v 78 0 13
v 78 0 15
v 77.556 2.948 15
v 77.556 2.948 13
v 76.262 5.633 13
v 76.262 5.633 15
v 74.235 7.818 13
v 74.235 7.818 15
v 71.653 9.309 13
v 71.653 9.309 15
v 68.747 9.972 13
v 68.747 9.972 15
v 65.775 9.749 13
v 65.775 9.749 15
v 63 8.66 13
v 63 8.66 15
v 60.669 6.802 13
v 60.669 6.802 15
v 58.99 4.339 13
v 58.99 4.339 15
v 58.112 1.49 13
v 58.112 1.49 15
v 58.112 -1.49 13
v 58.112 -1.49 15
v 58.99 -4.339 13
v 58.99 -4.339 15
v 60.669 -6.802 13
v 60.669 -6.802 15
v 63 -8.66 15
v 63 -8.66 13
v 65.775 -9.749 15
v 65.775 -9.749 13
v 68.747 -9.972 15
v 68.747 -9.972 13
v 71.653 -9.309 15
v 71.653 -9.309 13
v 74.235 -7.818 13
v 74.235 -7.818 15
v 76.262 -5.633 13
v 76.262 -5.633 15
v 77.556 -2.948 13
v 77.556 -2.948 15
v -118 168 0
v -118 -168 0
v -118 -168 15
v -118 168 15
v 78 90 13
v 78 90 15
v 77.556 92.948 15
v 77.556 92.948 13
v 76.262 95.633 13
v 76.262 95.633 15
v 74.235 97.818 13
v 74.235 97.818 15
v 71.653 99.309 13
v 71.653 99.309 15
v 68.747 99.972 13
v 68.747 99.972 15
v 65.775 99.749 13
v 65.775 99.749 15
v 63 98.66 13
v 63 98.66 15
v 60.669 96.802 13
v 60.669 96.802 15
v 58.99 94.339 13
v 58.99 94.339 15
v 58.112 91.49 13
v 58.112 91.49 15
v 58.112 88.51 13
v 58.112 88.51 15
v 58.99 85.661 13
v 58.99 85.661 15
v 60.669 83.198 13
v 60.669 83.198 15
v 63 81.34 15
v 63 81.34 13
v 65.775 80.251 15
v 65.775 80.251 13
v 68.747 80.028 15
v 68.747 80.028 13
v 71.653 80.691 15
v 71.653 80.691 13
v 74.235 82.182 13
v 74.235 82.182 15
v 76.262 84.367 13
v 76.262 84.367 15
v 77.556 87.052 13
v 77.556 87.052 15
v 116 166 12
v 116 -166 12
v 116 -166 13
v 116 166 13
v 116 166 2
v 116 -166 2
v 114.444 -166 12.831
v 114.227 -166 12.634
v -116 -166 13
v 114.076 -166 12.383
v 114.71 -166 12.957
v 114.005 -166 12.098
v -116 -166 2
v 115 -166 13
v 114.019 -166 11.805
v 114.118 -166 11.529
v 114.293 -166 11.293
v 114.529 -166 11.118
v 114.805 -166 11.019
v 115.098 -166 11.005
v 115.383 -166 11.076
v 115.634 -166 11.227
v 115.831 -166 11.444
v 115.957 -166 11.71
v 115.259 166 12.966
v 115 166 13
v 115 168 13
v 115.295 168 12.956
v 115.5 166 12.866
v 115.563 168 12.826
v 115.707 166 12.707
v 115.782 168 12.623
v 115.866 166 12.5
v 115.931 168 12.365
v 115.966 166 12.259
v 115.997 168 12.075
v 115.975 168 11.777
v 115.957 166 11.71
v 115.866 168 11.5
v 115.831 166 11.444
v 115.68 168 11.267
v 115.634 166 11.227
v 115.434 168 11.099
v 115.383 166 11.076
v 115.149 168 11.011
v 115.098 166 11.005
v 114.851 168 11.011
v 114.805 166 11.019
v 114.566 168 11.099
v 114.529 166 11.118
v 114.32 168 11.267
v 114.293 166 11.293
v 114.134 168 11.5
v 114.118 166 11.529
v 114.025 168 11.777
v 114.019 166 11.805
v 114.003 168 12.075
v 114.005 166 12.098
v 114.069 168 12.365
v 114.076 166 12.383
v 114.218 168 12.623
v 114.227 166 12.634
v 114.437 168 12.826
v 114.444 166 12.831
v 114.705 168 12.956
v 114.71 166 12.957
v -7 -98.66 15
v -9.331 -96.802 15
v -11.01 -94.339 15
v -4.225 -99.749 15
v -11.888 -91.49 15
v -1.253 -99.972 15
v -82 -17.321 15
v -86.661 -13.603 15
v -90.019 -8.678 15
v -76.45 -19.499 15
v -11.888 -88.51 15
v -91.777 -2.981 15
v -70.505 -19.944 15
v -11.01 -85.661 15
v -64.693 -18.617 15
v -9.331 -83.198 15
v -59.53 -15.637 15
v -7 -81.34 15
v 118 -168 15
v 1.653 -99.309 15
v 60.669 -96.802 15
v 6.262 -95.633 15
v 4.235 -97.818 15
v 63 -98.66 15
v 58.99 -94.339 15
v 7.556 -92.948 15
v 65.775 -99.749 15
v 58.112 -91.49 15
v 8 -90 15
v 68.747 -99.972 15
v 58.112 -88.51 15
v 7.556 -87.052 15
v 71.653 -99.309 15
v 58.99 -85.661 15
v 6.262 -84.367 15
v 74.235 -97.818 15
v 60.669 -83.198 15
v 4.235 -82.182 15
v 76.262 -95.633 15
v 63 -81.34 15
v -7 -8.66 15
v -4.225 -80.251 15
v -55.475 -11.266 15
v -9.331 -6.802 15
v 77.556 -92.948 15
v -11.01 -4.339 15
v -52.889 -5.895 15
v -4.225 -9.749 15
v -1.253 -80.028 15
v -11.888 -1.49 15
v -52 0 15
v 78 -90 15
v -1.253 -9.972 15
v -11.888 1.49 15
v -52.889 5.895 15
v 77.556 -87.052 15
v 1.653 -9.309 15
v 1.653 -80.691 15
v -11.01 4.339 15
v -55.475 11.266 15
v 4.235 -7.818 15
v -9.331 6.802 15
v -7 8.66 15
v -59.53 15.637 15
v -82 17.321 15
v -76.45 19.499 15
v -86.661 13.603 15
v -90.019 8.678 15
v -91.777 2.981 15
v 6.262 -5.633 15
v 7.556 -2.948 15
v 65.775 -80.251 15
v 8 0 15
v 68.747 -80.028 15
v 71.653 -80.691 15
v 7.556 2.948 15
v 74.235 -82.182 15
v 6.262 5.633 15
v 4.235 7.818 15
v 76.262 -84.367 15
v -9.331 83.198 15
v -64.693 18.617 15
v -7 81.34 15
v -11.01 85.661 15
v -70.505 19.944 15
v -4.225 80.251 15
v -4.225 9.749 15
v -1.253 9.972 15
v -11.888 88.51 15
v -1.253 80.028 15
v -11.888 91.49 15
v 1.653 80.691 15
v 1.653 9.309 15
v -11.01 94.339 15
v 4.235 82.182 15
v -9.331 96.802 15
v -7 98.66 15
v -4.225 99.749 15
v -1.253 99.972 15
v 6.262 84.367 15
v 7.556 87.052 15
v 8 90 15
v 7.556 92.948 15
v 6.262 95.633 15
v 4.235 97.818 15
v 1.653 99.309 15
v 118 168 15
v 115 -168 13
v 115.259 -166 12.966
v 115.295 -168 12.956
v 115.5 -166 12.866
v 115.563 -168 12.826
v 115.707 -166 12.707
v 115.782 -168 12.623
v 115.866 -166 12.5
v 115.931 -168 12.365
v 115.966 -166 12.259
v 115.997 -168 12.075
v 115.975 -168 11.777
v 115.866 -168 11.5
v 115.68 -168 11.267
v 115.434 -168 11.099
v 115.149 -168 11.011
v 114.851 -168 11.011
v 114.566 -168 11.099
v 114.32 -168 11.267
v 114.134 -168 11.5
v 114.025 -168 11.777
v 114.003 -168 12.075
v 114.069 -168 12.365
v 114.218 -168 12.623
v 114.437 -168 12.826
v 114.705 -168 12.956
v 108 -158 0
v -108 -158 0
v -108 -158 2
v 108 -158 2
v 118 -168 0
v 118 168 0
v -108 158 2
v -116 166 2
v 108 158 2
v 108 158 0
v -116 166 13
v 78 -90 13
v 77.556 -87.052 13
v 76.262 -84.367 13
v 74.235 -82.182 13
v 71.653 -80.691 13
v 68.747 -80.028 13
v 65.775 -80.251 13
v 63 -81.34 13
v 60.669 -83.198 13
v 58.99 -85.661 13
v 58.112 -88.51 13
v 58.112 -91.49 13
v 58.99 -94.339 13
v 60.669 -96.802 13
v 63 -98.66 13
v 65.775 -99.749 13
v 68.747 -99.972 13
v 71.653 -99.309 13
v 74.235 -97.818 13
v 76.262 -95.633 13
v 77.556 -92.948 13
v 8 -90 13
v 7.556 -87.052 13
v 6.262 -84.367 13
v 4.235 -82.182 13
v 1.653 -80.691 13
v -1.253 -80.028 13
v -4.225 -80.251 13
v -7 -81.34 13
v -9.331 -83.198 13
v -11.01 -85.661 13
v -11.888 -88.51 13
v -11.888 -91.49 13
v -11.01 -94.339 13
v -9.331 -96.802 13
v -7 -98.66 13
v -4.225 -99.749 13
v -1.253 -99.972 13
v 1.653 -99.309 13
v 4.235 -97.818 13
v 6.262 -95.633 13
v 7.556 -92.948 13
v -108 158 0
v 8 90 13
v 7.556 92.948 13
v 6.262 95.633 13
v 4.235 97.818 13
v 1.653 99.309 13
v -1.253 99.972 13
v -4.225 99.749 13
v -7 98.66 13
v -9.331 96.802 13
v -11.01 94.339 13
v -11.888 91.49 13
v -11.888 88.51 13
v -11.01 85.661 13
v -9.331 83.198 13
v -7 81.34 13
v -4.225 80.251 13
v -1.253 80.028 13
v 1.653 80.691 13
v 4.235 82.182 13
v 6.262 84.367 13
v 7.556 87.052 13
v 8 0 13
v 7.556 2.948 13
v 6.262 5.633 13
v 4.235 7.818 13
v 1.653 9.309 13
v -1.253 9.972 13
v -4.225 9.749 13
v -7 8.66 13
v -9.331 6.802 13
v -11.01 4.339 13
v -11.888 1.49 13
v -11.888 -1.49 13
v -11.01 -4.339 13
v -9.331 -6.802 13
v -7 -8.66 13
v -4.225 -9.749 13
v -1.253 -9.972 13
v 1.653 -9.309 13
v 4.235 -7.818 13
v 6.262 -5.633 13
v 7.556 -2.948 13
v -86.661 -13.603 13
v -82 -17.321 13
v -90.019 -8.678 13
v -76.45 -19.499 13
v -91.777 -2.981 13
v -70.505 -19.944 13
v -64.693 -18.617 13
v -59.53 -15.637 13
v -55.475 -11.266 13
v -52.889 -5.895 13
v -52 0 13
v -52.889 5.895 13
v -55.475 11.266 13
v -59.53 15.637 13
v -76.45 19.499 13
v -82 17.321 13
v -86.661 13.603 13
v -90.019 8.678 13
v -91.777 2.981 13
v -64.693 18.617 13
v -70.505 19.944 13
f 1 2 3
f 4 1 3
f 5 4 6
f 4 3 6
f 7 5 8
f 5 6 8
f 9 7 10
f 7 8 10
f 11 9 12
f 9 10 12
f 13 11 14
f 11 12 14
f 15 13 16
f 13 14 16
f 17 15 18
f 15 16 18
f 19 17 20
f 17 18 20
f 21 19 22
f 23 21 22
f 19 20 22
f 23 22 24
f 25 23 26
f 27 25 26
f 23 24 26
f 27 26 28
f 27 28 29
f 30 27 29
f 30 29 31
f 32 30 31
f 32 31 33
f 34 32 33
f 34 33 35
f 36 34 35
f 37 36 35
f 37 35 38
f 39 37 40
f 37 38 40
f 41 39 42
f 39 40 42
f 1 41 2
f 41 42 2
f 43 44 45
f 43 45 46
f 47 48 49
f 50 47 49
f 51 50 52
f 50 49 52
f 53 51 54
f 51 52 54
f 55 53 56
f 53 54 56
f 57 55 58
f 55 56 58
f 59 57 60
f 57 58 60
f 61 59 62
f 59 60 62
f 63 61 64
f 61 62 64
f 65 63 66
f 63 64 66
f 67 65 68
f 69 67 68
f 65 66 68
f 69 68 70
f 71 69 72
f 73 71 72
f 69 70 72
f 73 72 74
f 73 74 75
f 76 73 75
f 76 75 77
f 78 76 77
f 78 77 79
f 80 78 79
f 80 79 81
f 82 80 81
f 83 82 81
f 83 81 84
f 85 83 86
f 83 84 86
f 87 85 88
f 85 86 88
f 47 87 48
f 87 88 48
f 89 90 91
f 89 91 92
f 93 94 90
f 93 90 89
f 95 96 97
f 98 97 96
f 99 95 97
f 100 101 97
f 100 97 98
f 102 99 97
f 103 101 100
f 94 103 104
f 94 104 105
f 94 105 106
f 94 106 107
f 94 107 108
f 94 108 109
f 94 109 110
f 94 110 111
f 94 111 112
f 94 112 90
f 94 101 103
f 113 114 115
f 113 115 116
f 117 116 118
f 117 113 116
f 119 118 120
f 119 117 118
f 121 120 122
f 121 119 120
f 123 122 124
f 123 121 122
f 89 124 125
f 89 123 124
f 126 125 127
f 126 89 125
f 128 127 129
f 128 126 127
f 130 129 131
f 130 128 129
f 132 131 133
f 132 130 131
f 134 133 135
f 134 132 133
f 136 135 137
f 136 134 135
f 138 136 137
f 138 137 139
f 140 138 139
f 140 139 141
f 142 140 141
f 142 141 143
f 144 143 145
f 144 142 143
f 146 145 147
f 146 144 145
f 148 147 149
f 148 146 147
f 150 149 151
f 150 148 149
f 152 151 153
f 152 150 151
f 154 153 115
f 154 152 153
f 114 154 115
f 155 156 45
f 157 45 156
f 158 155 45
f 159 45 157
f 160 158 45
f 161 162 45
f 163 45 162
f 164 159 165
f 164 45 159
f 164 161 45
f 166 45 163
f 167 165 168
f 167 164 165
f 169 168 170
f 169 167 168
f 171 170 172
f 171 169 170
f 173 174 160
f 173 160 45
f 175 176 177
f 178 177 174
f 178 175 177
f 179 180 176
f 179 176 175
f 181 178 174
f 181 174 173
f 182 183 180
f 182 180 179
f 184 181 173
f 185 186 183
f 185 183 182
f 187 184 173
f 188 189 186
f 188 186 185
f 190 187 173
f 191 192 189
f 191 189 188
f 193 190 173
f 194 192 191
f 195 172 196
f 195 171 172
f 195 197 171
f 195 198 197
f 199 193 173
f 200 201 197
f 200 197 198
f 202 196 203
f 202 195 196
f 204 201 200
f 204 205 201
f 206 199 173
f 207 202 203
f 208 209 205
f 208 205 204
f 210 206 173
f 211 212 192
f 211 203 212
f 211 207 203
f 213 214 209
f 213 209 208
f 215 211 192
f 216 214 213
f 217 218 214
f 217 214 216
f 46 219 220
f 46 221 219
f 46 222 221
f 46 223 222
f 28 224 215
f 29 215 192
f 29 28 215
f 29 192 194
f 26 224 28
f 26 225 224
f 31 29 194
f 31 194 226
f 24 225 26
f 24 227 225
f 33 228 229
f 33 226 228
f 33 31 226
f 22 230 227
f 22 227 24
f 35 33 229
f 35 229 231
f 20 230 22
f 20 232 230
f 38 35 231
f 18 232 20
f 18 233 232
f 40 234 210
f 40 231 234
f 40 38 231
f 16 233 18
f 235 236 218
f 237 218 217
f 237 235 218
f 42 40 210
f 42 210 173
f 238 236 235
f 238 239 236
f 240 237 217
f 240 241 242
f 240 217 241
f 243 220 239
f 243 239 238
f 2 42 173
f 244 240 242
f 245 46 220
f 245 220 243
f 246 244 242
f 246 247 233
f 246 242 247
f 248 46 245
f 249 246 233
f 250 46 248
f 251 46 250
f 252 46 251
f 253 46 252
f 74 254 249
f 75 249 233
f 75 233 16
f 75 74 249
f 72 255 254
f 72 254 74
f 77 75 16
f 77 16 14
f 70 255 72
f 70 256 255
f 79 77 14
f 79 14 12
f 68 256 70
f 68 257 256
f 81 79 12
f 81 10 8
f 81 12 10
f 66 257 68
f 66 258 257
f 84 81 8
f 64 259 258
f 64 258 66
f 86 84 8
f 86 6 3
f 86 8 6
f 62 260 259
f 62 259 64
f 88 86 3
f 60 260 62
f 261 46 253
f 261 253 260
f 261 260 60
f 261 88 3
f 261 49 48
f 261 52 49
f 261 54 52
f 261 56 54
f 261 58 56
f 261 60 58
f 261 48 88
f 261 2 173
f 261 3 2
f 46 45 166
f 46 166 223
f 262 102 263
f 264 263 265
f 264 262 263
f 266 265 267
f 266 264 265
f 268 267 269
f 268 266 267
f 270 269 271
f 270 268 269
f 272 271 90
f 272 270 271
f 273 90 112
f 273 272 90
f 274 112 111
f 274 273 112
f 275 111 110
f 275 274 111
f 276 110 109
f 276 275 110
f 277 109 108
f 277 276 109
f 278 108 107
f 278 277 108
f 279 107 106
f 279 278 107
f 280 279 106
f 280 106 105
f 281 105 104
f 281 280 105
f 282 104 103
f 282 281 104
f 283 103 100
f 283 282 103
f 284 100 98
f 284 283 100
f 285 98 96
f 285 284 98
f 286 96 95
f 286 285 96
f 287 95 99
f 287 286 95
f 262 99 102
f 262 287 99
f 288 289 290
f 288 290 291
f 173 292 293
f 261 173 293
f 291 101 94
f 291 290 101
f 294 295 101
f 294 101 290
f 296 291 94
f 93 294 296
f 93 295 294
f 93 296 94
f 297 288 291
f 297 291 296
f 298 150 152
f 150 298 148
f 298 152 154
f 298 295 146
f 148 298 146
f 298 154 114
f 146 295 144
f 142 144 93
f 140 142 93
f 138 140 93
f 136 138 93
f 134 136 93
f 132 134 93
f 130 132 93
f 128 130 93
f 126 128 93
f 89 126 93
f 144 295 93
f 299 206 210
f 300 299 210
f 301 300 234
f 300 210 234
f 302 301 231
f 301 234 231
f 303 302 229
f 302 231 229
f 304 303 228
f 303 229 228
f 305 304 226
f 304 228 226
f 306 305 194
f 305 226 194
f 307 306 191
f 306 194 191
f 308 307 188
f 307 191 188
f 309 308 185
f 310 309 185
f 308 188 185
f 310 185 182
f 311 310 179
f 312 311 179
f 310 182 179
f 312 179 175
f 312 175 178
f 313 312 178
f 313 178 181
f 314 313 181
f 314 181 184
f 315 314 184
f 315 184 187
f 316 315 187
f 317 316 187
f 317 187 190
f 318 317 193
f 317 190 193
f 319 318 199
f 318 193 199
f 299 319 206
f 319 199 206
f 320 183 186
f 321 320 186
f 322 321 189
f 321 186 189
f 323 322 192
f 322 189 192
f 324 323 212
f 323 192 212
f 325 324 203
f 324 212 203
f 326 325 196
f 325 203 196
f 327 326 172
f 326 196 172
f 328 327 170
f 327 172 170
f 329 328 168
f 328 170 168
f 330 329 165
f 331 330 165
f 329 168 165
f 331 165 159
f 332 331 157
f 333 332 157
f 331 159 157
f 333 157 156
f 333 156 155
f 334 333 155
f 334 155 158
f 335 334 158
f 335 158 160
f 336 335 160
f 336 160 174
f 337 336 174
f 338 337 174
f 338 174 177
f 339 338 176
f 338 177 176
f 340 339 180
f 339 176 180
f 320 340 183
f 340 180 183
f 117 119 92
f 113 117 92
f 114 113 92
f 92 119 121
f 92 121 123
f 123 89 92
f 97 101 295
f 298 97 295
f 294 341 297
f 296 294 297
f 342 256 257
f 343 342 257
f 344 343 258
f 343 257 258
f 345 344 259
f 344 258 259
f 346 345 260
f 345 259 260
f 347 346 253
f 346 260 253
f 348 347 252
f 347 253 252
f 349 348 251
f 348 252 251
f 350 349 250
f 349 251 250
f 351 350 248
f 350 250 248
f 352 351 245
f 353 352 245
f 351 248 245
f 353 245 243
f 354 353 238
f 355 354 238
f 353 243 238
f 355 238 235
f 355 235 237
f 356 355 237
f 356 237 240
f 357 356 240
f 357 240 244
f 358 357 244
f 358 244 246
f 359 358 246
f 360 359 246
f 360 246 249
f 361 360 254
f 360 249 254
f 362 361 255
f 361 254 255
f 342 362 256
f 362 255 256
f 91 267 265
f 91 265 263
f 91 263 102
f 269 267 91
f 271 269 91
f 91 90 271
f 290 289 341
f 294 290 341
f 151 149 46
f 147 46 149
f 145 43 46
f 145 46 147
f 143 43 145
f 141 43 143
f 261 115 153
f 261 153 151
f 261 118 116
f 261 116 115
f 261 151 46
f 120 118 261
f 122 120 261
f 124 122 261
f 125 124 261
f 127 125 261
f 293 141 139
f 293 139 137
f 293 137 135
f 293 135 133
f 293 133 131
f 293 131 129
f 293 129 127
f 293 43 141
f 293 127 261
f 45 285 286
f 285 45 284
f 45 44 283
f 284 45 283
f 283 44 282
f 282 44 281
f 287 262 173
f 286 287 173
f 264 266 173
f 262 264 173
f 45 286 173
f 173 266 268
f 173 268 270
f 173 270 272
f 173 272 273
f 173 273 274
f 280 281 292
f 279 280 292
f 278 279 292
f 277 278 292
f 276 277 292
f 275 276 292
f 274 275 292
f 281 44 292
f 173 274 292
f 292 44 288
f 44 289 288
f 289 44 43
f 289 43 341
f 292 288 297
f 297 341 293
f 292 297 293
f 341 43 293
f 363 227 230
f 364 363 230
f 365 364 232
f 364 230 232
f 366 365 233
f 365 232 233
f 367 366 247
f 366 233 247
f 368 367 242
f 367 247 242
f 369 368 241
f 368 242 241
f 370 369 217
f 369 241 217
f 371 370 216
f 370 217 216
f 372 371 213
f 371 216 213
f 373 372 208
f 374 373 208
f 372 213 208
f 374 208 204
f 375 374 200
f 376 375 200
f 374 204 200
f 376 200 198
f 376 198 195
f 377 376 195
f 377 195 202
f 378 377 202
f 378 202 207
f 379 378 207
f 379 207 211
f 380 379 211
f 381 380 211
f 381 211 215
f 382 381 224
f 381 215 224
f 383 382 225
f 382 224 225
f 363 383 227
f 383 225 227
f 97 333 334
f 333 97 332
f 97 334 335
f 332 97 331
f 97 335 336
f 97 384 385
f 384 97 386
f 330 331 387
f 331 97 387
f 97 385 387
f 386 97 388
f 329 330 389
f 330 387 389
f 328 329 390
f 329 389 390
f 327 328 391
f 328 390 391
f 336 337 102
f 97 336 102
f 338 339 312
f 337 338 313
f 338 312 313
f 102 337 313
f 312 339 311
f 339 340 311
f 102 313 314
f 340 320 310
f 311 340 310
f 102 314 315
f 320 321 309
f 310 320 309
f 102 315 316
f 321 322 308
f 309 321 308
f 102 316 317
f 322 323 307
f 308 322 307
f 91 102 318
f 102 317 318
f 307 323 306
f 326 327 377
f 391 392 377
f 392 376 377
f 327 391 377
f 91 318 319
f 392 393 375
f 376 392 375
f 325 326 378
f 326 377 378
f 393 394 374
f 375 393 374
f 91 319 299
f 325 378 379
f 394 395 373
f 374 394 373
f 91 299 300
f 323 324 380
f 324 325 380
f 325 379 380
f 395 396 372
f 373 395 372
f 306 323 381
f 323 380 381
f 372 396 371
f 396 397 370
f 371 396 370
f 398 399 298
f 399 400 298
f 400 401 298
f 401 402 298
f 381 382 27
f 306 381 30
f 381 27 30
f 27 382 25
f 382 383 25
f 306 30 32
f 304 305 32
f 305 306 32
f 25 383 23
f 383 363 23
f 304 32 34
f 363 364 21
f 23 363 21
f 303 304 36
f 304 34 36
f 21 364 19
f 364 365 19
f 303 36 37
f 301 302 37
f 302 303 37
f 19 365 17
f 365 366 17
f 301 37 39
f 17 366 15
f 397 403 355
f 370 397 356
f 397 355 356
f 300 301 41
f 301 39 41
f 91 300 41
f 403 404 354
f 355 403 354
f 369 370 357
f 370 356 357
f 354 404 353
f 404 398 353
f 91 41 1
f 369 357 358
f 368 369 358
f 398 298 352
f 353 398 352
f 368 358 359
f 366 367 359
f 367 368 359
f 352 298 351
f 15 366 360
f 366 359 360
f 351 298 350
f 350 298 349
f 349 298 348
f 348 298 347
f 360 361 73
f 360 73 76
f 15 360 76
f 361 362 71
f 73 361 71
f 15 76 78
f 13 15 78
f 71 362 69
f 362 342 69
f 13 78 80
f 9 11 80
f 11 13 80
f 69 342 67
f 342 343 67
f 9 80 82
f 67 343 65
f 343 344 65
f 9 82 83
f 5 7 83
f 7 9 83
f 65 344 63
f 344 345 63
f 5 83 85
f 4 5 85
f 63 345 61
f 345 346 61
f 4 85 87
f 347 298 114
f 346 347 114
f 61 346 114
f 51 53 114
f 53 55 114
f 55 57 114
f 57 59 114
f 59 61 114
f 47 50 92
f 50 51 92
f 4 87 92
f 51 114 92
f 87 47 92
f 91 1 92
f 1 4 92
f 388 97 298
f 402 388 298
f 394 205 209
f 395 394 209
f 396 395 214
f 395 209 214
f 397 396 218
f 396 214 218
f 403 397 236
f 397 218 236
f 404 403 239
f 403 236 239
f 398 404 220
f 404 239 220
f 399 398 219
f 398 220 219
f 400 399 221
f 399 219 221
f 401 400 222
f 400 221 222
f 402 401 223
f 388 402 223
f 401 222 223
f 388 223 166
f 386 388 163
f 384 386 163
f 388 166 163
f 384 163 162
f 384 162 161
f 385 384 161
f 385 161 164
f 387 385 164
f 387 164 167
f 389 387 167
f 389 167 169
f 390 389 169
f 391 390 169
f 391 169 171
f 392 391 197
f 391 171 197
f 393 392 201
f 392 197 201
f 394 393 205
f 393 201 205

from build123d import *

# Parameters (mm, degrees)
SKETCH_1_W               = 236
SKETCH_1_H               = 336
EXTRUDE_1_DEPTH          = 15
SHELL_2_T                = -2
SKETCH_2_W               = 232
SKETCH_2_H               = 332
SKETCH_2_W_2             = 216
SKETCH_2_H_2             = 316
EXTRUDE_2_DEPTH          = 2
CUT_EXTRUDE_1_DEPTH      = 357.433724555
CUT_EXTRUDE_1_DEPTH_BACK = 357.433724555
SKETCH_3_R               = 1
SKETCH_4_R               = 20
SKETCH_4_R_2             = 10
CUT_EXTRUDE_2_DEPTH      = 2


with BuildPart() as part:
    # 草图1 → 凸台-拉伸1 (new body)
    with BuildSketch(Plane.XY):
        Rectangle(SKETCH_1_W, SKETCH_1_H)
    extrude(amount=EXTRUDE_1_DEPTH)

    # 抽壳2
    shell_2_openings = [part.faces().sort_by_distance(p)[0] for p in [
        (0, 0, 0),
    ]]
    offset(amount=SHELL_2_T, openings=shell_2_openings, kind=Kind.INTERSECTION)

    # 草图2 → 凸台-拉伸2 (add)
    with BuildSketch(Plane.XY):
        Rectangle(SKETCH_2_W, SKETCH_2_H)
        Rectangle(SKETCH_2_W_2, SKETCH_2_H_2, mode=Mode.SUBTRACT)
    extrude(amount=EXTRUDE_2_DEPTH)

    # 草图3 → 切除-拉伸1 (cut, two sides: drawn at the far end of the back side and taken through both)
    with BuildSketch(Plane(origin=(0, 168, 0), x_dir=(1, 0, 0), z_dir=(0, 1, 0)).offset(-CUT_EXTRUDE_1_DEPTH_BACK)):
        with Locations(Location((115, -12, 0), (0, 0, 270))):
            Circle(SKETCH_3_R)
    extrude(amount=CUT_EXTRUDE_1_DEPTH + CUT_EXTRUDE_1_DEPTH_BACK, mode=Mode.SUBTRACT)

    # 草图4 → 切除-拉伸2 (cut)
    with BuildSketch(Plane.XY.offset(15)):
        with Locations((-72, 0)):
            Circle(SKETCH_4_R)
        with Locations((-2, 0)):
            Circle(SKETCH_4_R_2)
        with Locations((68, 0)):
            Circle(SKETCH_4_R_2)
        with Locations((68, 90)):
            Circle(SKETCH_4_R_2)
        with Locations((-2, 90)):
            Circle(SKETCH_4_R_2)
        with Locations((68, -90)):
            Circle(SKETCH_4_R_2)
        with Locations((-2, -90)):
            Circle(SKETCH_4_R_2)
    extrude(amount=-CUT_EXTRUDE_2_DEPTH, mode=Mode.SUBTRACT)


solid = part.part
